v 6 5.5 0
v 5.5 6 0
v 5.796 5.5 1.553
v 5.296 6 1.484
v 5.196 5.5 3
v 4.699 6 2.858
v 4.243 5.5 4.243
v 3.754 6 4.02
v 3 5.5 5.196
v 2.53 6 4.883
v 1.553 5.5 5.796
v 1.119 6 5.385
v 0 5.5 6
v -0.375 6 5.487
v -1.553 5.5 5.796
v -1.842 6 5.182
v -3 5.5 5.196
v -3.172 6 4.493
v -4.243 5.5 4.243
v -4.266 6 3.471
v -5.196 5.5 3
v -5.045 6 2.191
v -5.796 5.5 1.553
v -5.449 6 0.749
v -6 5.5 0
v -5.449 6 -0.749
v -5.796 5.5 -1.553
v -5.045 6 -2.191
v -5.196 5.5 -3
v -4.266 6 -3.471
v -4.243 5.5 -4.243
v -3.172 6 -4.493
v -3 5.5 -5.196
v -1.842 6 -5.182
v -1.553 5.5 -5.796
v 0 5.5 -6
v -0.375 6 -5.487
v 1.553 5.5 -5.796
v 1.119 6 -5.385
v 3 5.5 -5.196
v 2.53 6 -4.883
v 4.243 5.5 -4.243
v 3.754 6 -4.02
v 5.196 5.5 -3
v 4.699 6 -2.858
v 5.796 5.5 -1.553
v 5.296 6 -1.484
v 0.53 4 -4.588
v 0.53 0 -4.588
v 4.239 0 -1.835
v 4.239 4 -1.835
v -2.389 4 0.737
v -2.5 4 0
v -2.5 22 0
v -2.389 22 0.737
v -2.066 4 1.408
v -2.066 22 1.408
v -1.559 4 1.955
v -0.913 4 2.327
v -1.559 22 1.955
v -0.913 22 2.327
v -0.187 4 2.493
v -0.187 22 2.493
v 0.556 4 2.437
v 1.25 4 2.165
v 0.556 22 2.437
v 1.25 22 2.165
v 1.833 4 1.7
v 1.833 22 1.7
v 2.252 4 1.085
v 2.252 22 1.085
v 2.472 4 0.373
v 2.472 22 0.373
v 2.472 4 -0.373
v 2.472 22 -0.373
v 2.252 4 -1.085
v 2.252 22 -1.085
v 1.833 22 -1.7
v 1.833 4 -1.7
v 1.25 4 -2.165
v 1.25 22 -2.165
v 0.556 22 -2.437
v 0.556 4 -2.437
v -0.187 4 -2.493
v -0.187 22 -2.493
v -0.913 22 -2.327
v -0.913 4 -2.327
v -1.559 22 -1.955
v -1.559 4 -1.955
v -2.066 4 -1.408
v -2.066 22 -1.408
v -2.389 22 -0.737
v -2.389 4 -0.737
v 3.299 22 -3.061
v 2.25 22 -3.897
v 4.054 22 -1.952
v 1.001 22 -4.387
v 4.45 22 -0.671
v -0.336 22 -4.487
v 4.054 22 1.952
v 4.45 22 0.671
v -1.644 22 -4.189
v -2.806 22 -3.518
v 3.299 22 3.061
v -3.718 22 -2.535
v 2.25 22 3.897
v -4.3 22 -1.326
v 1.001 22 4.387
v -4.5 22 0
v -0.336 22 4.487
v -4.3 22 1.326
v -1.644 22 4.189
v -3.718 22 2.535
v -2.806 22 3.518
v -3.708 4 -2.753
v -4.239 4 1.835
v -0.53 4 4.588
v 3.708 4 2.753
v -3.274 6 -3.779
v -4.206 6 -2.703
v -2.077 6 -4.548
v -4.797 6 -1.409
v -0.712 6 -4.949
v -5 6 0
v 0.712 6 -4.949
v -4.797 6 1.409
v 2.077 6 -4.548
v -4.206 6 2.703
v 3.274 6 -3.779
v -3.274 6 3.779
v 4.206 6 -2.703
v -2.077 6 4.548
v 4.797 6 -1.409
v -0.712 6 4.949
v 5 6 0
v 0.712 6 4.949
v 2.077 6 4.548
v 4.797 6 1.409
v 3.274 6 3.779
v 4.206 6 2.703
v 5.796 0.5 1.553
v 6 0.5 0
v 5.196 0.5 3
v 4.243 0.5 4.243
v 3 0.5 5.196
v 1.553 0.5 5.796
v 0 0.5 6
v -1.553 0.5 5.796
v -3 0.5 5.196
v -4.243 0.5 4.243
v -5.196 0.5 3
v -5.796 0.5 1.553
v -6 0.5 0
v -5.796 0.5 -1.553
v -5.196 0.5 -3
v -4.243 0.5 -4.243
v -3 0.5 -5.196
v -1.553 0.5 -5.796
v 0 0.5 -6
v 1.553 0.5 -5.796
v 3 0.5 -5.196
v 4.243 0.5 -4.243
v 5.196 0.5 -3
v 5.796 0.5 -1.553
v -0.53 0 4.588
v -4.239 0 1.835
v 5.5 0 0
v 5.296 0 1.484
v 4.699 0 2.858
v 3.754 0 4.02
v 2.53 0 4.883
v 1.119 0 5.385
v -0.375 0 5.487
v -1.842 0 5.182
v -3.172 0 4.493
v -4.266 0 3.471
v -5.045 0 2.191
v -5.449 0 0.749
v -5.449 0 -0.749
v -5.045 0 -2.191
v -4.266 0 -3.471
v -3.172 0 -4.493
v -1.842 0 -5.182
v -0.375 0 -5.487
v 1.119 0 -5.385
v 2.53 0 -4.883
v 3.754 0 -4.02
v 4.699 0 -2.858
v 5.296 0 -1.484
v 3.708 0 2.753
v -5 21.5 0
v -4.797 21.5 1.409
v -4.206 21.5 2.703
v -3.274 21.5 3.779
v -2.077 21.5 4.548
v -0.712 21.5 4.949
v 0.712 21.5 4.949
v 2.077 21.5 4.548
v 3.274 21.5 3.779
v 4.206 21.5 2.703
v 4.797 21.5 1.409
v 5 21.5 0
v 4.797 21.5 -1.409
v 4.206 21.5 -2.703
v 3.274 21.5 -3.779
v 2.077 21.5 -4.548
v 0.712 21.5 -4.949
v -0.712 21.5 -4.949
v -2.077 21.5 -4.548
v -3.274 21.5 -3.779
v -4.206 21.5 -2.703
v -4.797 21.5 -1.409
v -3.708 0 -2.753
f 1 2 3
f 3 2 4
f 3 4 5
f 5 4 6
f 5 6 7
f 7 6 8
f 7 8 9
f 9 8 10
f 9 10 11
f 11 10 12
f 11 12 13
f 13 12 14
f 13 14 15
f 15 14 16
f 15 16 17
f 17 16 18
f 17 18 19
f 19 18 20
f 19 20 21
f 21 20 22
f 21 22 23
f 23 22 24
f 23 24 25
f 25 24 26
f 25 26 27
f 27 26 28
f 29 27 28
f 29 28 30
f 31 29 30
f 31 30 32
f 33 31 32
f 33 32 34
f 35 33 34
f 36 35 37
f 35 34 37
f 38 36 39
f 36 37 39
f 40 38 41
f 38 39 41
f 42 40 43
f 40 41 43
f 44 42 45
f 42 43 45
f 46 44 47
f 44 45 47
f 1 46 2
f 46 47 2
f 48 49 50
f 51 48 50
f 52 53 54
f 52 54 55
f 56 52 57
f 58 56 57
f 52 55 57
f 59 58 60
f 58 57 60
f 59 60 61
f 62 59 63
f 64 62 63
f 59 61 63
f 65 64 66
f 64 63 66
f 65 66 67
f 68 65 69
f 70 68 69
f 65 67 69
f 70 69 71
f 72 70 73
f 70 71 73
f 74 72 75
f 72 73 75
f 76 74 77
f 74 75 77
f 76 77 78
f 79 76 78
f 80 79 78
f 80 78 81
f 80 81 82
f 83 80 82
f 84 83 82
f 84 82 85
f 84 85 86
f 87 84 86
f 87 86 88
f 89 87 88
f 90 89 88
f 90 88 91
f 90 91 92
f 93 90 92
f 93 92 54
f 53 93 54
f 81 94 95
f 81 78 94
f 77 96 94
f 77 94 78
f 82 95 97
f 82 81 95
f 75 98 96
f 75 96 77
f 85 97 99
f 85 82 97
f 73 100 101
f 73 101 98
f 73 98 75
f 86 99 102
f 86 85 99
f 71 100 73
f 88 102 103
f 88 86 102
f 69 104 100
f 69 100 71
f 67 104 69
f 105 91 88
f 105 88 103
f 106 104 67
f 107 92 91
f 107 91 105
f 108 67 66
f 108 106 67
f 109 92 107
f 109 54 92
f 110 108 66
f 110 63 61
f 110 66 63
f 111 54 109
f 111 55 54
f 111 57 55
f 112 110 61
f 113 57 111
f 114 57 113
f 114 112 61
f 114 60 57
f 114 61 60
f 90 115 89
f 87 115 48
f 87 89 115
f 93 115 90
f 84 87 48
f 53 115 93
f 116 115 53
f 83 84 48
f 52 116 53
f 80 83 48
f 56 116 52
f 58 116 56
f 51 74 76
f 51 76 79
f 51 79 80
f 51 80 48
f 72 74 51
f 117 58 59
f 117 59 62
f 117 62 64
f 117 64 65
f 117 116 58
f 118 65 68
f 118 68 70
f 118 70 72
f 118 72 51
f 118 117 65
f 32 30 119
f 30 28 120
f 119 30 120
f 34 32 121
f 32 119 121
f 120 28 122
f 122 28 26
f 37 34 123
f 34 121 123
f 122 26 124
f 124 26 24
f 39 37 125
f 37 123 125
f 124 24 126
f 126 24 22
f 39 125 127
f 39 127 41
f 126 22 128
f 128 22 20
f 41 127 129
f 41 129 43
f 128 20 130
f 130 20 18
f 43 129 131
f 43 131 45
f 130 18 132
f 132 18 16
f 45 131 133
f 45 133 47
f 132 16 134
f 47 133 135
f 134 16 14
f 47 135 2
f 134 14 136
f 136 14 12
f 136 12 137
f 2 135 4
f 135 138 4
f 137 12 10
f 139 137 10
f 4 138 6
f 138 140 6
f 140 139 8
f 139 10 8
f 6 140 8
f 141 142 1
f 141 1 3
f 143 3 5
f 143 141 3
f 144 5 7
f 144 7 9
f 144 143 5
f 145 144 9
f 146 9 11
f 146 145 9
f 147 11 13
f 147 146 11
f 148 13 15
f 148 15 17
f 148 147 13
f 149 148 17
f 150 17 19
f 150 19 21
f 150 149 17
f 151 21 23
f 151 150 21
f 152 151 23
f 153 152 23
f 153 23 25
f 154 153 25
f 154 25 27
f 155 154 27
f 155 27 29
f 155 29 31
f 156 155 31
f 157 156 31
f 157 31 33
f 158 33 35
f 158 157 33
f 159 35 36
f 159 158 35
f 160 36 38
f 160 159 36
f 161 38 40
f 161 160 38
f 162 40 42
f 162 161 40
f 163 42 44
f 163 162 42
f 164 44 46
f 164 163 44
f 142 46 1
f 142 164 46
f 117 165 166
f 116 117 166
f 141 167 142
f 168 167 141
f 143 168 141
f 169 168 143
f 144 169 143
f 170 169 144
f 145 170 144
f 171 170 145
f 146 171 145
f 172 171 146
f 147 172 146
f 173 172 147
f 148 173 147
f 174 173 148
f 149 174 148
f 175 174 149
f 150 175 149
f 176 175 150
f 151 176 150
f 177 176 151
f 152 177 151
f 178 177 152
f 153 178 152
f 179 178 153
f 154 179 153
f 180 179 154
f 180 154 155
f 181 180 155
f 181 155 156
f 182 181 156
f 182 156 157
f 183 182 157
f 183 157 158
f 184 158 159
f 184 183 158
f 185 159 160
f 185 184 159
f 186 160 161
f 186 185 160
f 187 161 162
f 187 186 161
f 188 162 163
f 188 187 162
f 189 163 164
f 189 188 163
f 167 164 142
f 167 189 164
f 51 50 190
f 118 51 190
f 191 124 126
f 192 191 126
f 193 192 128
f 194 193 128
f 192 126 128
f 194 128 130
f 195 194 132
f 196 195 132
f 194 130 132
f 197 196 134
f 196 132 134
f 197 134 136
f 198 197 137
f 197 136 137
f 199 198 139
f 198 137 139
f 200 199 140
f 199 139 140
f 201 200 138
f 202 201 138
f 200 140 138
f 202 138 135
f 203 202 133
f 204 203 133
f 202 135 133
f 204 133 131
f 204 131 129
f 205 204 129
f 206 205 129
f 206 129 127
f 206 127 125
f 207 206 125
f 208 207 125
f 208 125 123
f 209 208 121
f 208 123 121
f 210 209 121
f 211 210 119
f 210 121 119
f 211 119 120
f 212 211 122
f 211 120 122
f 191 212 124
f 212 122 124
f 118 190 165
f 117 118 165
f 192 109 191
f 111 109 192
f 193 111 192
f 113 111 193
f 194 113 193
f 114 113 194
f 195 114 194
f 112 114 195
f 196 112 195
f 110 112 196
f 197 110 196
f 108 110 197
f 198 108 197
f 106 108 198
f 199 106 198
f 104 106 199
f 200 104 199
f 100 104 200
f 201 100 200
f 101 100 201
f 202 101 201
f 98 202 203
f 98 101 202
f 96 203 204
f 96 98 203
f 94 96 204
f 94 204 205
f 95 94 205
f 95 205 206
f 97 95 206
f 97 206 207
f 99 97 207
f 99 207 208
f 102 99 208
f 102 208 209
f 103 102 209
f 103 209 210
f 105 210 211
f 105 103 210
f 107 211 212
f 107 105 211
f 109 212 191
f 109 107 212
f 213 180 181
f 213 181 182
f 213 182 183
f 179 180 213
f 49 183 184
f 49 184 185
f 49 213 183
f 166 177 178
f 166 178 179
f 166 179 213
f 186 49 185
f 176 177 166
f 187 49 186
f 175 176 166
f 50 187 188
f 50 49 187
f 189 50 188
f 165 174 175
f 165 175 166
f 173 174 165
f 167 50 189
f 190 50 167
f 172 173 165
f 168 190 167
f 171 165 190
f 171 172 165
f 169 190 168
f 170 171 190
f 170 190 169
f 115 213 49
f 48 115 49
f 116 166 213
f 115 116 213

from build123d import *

# Parameters (mm, degrees)
F0_R     = 6
F1_DEPTH = 6
F3_DEPTH = 4
F4_R     = 5
F5_DEPTH = 16
F6_R     = 2.5
F7_DEPTH = 22.001
F8_SIZE  = 0.5


with BuildPart() as f1:
    # F0 (on Front) → F1 (new body)
    with BuildSketch(Plane.XZ):
        Circle(F0_R)
    extrude(amount=-F1_DEPTH)

    # F2 (on face) → F3 (cut)
    with BuildSketch(Plane.XZ):
        Polygon((3.708328, 2.753478), (-0.530418, 4.588245), (-4.238745, 1.834767), (-3.708328, -2.753478), (0.530418, -4.588245), (4.238745, -1.834767), align=None)
    extrude(amount=-F3_DEPTH, mode=Mode.SUBTRACT)

    # F4 (on face) → F5 (join)
    with BuildSketch(Plane(origin=(0, 6, 0), x_dir=(-1, 0, 0), z_dir=(0, 1, 0))):
        Circle(F4_R)
    extrude(amount=F5_DEPTH)

    # F6 (on face) → F7 (cut, through all)
    with BuildSketch(Plane(origin=(0, 22, 0), x_dir=(-1, 0, 0), z_dir=(0, 1, 0))):
        Circle(F6_R)
    extrude(amount=-F7_DEPTH, mode=Mode.SUBTRACT)

    # F8
    f8_edges = [f1.edges().sort_by_distance(p)[0] for p in [
        (-6, 0, 0),
        (6, 3, 0),
        (-6, 6, 0),
        (5, 22, 0),
    ]]
    chamfer(f8_edges, length=F8_SIZE)


solid = f1.part
